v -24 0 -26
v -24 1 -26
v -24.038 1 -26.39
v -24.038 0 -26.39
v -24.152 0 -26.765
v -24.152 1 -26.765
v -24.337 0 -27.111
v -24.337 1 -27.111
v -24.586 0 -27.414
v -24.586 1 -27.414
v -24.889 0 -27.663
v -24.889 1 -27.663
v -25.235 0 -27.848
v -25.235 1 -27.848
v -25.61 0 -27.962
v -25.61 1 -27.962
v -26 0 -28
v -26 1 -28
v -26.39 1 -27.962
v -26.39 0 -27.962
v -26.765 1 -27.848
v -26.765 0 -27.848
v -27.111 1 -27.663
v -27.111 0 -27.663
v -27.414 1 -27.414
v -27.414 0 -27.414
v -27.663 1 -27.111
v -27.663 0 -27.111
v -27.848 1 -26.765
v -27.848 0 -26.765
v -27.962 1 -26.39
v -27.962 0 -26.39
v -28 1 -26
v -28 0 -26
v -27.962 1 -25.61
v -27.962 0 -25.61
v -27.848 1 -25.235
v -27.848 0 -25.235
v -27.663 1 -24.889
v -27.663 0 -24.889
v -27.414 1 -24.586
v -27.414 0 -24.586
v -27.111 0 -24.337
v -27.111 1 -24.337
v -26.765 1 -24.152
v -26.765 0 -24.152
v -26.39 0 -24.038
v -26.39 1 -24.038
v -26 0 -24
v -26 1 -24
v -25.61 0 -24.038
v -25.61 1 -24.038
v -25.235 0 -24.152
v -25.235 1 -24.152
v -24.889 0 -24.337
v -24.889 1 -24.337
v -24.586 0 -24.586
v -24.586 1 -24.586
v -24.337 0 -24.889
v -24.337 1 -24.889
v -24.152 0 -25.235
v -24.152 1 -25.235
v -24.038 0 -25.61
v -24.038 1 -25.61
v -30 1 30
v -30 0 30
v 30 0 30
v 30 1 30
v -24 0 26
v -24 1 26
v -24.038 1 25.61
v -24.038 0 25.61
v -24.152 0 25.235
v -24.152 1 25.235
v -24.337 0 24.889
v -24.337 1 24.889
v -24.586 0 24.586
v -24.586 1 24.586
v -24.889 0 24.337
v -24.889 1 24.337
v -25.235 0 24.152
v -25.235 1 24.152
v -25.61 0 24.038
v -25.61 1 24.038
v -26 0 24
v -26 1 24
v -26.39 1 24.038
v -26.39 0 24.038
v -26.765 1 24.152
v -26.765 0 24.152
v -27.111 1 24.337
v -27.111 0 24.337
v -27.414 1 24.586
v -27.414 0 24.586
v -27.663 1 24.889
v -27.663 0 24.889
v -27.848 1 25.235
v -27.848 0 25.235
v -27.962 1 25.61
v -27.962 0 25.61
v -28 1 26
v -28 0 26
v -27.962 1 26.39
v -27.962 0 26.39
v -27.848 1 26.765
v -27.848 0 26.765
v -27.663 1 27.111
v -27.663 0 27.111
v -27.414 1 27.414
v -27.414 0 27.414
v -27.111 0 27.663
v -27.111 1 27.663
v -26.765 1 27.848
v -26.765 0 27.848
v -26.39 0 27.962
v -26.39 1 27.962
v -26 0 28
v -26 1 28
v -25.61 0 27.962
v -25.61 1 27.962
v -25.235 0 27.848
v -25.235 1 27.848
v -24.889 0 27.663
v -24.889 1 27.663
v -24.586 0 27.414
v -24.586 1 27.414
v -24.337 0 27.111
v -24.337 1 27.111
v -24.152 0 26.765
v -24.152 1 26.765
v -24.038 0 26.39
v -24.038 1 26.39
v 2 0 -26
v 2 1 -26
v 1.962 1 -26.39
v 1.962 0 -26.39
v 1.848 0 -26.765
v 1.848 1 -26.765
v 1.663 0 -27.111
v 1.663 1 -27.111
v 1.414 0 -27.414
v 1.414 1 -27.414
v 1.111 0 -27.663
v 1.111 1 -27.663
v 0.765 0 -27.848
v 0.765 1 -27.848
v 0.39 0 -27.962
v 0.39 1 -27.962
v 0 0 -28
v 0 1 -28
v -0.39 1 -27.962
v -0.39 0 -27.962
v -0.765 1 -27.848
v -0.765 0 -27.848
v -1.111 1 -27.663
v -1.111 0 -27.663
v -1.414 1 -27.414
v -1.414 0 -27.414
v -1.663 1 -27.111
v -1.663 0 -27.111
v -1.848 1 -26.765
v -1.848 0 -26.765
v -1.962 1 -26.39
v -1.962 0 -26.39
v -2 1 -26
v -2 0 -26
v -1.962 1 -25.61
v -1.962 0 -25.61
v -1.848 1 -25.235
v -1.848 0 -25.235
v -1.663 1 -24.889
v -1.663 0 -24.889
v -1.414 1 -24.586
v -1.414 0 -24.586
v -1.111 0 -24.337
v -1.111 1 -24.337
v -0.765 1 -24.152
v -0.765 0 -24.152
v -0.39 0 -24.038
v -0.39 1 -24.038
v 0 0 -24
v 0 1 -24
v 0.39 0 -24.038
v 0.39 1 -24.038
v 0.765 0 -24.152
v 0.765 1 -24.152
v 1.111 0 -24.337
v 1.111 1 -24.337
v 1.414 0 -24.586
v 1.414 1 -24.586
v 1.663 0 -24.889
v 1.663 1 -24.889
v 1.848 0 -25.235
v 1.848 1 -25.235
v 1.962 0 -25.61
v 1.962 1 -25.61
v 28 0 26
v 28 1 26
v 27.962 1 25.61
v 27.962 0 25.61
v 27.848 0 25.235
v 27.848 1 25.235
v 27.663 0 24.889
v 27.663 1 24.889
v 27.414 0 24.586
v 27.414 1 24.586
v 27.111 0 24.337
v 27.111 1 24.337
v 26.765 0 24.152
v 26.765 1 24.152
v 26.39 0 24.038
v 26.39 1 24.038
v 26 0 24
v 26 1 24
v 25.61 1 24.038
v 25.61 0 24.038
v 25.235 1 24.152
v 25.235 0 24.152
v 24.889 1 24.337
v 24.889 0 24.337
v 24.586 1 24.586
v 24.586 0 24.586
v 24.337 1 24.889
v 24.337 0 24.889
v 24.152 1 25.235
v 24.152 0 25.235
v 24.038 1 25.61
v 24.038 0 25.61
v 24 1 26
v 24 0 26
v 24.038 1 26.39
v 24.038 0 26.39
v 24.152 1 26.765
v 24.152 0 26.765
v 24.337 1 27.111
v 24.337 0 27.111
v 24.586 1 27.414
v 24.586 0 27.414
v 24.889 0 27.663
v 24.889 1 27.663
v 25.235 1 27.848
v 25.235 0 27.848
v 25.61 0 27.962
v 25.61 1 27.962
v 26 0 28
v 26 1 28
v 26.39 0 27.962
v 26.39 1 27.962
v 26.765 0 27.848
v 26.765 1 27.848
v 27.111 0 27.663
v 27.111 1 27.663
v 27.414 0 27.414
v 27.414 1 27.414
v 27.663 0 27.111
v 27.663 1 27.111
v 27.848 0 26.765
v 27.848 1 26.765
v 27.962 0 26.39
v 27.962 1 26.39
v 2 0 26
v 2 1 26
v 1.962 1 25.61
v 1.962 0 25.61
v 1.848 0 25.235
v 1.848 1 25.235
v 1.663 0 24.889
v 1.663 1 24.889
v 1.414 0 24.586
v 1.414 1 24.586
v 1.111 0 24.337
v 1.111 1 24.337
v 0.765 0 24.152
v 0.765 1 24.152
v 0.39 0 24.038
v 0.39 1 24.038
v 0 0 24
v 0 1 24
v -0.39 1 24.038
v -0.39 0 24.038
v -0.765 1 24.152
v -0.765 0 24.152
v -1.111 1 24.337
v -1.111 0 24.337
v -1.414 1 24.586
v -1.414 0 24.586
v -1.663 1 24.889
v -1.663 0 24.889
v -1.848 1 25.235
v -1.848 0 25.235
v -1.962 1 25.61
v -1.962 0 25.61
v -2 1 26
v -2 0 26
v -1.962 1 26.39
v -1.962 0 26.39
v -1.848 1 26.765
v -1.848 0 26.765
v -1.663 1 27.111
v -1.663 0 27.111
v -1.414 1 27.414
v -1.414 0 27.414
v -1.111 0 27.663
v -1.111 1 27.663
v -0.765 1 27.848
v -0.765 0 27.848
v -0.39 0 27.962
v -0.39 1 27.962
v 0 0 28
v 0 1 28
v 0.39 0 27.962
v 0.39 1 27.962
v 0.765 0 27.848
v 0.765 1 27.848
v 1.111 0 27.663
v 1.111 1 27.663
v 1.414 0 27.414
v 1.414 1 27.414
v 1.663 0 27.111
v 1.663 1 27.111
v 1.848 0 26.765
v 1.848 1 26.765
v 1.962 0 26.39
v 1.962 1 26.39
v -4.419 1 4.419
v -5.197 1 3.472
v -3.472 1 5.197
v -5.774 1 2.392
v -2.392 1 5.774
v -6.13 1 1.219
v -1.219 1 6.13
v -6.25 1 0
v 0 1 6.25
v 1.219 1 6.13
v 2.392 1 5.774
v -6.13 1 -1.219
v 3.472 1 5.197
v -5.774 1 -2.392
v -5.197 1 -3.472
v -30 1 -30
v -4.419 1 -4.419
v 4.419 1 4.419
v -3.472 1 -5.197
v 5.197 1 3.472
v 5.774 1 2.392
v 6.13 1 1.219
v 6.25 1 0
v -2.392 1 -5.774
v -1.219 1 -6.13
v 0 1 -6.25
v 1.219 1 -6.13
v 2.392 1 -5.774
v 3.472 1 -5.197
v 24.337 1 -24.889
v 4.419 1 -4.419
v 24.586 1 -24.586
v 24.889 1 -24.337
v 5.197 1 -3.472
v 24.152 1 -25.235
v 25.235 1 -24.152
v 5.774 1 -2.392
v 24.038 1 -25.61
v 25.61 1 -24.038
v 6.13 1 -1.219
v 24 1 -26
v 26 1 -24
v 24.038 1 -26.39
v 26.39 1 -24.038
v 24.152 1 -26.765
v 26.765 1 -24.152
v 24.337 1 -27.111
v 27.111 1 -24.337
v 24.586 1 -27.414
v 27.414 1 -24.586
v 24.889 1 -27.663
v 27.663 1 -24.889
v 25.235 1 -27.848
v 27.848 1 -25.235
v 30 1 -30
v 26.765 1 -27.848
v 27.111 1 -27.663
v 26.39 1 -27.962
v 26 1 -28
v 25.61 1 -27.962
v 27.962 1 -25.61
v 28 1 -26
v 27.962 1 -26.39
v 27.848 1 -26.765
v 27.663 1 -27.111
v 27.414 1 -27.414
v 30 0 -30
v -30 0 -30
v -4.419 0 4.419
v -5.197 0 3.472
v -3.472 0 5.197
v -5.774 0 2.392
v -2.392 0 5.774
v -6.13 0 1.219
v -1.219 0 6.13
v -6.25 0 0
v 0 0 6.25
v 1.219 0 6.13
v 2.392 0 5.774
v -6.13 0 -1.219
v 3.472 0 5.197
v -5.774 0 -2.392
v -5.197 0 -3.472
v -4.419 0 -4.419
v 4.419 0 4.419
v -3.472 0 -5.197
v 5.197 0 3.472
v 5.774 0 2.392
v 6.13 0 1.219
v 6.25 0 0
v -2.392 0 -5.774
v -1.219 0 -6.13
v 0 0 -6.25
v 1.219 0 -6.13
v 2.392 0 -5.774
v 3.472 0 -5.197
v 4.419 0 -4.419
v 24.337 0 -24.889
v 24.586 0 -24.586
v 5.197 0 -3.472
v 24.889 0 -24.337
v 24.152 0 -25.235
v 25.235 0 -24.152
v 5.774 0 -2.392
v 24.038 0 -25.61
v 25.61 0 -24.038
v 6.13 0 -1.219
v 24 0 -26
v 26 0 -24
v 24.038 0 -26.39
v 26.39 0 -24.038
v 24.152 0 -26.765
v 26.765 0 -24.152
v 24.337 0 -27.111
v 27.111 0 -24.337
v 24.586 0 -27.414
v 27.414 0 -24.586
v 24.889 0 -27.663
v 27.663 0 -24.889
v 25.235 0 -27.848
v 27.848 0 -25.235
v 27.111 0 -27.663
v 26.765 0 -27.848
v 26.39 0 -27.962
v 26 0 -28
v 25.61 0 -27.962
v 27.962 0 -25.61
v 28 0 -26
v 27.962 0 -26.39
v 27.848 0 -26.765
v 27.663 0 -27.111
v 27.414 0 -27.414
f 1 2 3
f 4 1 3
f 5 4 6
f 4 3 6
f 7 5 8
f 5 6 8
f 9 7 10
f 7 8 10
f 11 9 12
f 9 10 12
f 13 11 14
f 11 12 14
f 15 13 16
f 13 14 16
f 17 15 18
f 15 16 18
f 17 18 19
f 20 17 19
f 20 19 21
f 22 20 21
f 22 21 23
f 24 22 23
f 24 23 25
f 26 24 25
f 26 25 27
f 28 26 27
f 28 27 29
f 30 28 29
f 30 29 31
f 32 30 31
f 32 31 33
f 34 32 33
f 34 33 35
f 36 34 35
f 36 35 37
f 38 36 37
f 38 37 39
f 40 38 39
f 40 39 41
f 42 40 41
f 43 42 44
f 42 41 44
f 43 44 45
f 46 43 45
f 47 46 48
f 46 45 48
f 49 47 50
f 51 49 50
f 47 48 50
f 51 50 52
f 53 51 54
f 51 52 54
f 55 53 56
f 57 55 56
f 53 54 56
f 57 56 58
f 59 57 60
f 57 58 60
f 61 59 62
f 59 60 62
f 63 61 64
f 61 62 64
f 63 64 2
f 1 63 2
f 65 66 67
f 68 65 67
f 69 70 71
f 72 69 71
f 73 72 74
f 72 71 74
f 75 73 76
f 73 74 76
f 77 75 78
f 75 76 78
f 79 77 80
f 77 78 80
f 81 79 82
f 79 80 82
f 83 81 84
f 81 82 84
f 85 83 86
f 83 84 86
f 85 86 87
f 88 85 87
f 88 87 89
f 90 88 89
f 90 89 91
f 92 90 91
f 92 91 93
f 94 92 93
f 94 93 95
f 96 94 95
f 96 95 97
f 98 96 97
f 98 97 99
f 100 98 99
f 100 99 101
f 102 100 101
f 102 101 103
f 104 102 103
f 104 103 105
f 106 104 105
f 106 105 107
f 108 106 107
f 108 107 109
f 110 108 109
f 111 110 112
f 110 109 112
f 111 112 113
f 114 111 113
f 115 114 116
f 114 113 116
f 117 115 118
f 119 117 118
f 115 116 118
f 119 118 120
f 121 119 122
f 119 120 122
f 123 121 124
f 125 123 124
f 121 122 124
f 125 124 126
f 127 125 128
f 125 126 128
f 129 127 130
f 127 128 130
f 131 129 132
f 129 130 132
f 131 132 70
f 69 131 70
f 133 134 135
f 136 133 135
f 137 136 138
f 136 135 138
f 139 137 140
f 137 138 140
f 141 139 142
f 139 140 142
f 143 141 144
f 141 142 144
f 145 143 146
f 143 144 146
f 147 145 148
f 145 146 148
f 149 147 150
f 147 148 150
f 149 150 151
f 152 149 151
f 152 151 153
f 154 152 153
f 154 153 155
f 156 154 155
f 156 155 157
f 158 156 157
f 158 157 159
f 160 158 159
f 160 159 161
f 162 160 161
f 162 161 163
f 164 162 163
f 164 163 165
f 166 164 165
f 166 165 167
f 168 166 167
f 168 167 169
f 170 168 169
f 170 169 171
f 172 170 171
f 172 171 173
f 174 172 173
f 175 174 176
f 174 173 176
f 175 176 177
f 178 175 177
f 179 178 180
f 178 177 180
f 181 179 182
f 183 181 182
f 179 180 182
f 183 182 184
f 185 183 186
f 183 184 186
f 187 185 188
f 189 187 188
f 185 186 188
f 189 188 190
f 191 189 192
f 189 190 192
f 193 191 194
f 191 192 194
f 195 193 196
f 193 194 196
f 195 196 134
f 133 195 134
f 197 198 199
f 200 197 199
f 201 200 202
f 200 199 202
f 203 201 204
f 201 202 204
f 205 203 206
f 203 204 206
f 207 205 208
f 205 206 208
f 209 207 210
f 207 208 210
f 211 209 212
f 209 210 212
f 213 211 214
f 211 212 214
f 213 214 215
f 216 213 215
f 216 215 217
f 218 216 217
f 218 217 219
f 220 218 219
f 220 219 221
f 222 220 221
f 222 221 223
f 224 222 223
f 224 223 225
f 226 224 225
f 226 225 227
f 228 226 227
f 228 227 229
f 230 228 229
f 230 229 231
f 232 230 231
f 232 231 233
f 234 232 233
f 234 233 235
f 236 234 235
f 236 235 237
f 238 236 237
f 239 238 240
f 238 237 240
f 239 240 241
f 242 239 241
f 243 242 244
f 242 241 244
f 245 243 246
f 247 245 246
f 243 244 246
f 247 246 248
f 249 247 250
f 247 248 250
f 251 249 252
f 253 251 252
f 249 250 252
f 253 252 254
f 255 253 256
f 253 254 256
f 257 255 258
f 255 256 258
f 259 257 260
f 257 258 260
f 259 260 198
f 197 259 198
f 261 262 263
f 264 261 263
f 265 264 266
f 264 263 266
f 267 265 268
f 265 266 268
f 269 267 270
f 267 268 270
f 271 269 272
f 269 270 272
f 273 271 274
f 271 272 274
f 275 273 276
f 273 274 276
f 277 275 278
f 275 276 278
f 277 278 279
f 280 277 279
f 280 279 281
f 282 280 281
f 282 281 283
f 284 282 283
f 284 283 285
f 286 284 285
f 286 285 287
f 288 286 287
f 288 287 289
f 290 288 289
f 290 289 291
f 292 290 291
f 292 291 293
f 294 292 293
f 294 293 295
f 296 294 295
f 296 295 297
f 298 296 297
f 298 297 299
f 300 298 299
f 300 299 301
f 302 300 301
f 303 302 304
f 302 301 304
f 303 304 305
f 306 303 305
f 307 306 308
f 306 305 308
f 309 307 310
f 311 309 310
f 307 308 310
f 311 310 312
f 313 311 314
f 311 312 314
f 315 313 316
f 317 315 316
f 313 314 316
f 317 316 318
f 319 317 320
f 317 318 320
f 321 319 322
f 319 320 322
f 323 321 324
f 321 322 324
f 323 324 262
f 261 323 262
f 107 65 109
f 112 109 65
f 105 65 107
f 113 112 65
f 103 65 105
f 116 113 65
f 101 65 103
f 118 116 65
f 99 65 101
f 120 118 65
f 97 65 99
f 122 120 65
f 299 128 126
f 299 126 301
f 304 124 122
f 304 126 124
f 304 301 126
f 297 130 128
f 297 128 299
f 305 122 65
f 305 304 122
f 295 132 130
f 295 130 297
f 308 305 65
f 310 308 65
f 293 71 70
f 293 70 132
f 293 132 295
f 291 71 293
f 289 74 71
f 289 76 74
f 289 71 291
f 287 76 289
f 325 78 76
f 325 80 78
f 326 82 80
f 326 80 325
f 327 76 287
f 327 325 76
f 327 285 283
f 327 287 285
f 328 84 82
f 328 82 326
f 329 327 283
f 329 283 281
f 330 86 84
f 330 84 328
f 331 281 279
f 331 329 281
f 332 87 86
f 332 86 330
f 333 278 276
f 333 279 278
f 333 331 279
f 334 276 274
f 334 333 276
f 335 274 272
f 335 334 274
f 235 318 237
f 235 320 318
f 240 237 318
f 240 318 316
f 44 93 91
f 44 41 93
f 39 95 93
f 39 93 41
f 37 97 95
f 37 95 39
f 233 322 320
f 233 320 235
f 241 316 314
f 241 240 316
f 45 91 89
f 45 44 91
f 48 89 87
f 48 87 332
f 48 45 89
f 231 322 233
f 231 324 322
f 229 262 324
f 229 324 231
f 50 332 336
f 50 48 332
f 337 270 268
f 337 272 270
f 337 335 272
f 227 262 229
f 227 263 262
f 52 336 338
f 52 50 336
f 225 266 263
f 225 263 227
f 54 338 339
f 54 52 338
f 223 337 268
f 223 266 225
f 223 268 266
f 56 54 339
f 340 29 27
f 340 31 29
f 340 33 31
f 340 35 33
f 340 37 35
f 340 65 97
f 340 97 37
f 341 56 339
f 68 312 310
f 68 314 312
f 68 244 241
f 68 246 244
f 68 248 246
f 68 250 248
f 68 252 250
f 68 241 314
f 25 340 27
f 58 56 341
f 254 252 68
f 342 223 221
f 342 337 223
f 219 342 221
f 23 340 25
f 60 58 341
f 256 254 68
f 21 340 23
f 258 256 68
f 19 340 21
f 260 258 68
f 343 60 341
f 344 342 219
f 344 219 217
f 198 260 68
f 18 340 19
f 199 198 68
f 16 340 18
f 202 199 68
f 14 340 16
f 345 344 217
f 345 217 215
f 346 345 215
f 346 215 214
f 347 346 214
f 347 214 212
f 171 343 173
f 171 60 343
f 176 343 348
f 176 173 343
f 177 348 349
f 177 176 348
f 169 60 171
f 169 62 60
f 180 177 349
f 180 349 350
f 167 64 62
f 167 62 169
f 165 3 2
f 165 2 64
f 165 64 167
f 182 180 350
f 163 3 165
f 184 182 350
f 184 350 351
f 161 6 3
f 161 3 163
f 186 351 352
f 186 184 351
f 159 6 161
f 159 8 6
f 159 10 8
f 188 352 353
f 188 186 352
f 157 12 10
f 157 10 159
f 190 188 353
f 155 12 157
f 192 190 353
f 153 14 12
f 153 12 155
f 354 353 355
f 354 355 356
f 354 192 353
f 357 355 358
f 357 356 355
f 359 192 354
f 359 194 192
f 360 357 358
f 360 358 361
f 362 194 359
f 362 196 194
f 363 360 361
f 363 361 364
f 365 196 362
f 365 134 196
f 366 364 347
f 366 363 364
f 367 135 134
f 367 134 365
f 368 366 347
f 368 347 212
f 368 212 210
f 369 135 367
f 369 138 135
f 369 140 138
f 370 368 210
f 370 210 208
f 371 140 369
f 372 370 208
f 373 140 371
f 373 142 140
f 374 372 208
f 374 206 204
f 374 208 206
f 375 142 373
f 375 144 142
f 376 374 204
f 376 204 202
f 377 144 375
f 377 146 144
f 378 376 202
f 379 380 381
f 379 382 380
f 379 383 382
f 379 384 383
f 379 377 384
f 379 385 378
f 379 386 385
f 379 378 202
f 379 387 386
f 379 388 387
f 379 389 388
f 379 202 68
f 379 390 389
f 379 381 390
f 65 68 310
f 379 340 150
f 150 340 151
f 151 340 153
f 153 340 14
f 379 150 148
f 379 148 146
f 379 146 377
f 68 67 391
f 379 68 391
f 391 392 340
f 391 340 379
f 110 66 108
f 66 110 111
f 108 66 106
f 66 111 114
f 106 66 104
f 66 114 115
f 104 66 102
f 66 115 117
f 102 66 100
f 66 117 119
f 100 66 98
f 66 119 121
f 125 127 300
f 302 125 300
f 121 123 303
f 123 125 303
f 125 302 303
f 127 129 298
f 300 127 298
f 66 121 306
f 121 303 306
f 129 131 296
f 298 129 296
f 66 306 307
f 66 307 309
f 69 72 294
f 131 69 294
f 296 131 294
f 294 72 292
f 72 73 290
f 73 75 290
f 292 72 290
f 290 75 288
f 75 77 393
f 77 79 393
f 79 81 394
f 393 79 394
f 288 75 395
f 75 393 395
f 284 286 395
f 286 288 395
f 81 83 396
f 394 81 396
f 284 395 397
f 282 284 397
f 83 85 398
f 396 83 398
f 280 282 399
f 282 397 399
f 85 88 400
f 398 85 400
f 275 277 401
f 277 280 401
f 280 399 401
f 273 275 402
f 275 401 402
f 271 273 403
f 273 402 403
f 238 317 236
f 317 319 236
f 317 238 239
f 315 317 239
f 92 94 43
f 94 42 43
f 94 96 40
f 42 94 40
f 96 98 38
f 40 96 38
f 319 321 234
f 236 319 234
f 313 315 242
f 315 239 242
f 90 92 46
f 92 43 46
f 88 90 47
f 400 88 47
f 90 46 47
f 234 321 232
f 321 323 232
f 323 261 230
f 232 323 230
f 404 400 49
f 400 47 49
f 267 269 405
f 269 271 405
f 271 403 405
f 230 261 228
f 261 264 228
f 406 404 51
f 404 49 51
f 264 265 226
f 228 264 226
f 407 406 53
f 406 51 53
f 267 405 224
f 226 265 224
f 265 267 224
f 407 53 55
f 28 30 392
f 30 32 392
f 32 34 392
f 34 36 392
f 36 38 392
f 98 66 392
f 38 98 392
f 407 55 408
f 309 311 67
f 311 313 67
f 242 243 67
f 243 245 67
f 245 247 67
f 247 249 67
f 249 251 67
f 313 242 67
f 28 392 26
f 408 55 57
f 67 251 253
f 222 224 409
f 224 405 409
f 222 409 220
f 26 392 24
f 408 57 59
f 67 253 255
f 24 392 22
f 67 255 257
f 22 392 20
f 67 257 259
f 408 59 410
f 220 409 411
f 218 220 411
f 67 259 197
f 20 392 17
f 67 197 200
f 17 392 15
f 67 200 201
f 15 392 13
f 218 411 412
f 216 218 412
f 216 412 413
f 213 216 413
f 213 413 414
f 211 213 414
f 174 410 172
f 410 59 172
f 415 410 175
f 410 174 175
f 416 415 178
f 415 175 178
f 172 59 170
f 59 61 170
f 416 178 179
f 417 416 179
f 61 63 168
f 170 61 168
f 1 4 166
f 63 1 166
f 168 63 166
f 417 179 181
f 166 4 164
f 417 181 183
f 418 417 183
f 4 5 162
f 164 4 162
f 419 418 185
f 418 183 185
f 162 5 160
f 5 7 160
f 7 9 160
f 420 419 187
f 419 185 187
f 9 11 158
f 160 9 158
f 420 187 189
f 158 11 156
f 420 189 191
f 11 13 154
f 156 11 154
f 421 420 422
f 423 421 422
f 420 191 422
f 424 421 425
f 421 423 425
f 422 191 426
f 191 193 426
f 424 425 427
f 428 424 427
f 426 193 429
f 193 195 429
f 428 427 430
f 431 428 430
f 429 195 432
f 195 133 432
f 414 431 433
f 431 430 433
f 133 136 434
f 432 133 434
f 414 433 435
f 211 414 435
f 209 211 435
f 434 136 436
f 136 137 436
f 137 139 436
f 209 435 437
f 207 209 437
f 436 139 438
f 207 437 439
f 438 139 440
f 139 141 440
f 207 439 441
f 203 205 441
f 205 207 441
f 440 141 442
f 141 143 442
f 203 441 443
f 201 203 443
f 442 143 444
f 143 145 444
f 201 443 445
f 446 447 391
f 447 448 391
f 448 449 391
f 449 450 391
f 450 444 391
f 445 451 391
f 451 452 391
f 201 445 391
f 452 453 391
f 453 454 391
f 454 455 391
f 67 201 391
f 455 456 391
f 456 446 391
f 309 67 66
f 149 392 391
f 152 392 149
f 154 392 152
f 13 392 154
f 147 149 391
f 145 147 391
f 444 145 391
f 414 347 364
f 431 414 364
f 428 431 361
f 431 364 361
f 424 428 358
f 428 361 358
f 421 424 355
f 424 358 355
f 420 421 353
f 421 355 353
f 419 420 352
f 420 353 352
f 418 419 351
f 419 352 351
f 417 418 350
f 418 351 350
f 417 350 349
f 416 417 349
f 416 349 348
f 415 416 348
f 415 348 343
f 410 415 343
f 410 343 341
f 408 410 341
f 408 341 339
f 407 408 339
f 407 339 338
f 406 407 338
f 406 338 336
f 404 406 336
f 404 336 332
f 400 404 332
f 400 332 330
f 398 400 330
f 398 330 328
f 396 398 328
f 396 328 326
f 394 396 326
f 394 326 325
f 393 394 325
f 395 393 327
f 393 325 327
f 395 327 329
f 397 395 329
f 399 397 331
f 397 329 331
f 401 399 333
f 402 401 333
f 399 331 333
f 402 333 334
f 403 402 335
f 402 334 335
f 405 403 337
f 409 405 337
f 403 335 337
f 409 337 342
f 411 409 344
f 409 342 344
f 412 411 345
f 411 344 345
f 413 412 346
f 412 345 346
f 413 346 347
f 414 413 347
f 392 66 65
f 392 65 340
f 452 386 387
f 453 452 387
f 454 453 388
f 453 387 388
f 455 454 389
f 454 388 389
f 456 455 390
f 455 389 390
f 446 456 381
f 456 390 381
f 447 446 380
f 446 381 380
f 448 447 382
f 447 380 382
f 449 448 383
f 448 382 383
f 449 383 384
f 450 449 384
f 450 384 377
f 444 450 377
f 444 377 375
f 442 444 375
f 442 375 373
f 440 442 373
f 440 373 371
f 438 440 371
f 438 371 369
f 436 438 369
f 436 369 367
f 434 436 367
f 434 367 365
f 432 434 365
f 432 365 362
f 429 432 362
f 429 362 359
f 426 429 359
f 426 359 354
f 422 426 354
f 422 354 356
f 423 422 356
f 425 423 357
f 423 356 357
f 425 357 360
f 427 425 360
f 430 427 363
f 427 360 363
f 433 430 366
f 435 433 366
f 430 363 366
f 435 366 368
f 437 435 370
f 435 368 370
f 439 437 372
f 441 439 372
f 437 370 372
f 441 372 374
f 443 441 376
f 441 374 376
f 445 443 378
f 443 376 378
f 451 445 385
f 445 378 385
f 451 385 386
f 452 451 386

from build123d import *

# Parameters (mm, degrees)
SKETCH1_W           = 60
SKETCH1_H           = 60
BOSS_EXTRUDE1_DEPTH = 1
SKETCH2_R           = 2
CUT_EXTRUDE1_DEPTH  = 2
SKETCH4_R           = 6.25
CUT_EXTRUDE3_DEPTH  = 10


with BuildPart() as part:
    # Sketch1 → Boss-Extrude1 (new body)
    with BuildSketch(Plane(origin=(0, 0, 0), x_dir=(1, 0, 0), z_dir=(0, 1, 0))):
        Rectangle(SKETCH1_W, SKETCH1_H)
    extrude(amount=BOSS_EXTRUDE1_DEPTH)

    # Sketch2 → Cut-Extrude1 (cut, through all)
    with BuildSketch(Plane(origin=(0, 1, 0), x_dir=(1, 0, 0), z_dir=(0, 1, 0))):
        with Locations((-26, 26)):
            Circle(SKETCH2_R)
        with Locations((0, 26)):
            Circle(SKETCH2_R)
        with Locations((26, 26)):
            Circle(SKETCH2_R)
        with Locations((26, -26)):
            Circle(SKETCH2_R)
        with Locations((0, -26)):
            Circle(SKETCH2_R)
        with Locations((-26, -26)):
            Circle(SKETCH2_R)
    extrude(amount=-CUT_EXTRUDE1_DEPTH, mode=Mode.SUBTRACT)

    # Sketch4 → Cut-Extrude3 (cut)
    with BuildSketch(Plane(origin=(0, 1, 0), x_dir=(1, 0, 0), z_dir=(0, 1, 0))):
        Circle(SKETCH4_R)
    extrude(amount=-CUT_EXTRUDE3_DEPTH, mode=Mode.SUBTRACT)


solid = part.part
